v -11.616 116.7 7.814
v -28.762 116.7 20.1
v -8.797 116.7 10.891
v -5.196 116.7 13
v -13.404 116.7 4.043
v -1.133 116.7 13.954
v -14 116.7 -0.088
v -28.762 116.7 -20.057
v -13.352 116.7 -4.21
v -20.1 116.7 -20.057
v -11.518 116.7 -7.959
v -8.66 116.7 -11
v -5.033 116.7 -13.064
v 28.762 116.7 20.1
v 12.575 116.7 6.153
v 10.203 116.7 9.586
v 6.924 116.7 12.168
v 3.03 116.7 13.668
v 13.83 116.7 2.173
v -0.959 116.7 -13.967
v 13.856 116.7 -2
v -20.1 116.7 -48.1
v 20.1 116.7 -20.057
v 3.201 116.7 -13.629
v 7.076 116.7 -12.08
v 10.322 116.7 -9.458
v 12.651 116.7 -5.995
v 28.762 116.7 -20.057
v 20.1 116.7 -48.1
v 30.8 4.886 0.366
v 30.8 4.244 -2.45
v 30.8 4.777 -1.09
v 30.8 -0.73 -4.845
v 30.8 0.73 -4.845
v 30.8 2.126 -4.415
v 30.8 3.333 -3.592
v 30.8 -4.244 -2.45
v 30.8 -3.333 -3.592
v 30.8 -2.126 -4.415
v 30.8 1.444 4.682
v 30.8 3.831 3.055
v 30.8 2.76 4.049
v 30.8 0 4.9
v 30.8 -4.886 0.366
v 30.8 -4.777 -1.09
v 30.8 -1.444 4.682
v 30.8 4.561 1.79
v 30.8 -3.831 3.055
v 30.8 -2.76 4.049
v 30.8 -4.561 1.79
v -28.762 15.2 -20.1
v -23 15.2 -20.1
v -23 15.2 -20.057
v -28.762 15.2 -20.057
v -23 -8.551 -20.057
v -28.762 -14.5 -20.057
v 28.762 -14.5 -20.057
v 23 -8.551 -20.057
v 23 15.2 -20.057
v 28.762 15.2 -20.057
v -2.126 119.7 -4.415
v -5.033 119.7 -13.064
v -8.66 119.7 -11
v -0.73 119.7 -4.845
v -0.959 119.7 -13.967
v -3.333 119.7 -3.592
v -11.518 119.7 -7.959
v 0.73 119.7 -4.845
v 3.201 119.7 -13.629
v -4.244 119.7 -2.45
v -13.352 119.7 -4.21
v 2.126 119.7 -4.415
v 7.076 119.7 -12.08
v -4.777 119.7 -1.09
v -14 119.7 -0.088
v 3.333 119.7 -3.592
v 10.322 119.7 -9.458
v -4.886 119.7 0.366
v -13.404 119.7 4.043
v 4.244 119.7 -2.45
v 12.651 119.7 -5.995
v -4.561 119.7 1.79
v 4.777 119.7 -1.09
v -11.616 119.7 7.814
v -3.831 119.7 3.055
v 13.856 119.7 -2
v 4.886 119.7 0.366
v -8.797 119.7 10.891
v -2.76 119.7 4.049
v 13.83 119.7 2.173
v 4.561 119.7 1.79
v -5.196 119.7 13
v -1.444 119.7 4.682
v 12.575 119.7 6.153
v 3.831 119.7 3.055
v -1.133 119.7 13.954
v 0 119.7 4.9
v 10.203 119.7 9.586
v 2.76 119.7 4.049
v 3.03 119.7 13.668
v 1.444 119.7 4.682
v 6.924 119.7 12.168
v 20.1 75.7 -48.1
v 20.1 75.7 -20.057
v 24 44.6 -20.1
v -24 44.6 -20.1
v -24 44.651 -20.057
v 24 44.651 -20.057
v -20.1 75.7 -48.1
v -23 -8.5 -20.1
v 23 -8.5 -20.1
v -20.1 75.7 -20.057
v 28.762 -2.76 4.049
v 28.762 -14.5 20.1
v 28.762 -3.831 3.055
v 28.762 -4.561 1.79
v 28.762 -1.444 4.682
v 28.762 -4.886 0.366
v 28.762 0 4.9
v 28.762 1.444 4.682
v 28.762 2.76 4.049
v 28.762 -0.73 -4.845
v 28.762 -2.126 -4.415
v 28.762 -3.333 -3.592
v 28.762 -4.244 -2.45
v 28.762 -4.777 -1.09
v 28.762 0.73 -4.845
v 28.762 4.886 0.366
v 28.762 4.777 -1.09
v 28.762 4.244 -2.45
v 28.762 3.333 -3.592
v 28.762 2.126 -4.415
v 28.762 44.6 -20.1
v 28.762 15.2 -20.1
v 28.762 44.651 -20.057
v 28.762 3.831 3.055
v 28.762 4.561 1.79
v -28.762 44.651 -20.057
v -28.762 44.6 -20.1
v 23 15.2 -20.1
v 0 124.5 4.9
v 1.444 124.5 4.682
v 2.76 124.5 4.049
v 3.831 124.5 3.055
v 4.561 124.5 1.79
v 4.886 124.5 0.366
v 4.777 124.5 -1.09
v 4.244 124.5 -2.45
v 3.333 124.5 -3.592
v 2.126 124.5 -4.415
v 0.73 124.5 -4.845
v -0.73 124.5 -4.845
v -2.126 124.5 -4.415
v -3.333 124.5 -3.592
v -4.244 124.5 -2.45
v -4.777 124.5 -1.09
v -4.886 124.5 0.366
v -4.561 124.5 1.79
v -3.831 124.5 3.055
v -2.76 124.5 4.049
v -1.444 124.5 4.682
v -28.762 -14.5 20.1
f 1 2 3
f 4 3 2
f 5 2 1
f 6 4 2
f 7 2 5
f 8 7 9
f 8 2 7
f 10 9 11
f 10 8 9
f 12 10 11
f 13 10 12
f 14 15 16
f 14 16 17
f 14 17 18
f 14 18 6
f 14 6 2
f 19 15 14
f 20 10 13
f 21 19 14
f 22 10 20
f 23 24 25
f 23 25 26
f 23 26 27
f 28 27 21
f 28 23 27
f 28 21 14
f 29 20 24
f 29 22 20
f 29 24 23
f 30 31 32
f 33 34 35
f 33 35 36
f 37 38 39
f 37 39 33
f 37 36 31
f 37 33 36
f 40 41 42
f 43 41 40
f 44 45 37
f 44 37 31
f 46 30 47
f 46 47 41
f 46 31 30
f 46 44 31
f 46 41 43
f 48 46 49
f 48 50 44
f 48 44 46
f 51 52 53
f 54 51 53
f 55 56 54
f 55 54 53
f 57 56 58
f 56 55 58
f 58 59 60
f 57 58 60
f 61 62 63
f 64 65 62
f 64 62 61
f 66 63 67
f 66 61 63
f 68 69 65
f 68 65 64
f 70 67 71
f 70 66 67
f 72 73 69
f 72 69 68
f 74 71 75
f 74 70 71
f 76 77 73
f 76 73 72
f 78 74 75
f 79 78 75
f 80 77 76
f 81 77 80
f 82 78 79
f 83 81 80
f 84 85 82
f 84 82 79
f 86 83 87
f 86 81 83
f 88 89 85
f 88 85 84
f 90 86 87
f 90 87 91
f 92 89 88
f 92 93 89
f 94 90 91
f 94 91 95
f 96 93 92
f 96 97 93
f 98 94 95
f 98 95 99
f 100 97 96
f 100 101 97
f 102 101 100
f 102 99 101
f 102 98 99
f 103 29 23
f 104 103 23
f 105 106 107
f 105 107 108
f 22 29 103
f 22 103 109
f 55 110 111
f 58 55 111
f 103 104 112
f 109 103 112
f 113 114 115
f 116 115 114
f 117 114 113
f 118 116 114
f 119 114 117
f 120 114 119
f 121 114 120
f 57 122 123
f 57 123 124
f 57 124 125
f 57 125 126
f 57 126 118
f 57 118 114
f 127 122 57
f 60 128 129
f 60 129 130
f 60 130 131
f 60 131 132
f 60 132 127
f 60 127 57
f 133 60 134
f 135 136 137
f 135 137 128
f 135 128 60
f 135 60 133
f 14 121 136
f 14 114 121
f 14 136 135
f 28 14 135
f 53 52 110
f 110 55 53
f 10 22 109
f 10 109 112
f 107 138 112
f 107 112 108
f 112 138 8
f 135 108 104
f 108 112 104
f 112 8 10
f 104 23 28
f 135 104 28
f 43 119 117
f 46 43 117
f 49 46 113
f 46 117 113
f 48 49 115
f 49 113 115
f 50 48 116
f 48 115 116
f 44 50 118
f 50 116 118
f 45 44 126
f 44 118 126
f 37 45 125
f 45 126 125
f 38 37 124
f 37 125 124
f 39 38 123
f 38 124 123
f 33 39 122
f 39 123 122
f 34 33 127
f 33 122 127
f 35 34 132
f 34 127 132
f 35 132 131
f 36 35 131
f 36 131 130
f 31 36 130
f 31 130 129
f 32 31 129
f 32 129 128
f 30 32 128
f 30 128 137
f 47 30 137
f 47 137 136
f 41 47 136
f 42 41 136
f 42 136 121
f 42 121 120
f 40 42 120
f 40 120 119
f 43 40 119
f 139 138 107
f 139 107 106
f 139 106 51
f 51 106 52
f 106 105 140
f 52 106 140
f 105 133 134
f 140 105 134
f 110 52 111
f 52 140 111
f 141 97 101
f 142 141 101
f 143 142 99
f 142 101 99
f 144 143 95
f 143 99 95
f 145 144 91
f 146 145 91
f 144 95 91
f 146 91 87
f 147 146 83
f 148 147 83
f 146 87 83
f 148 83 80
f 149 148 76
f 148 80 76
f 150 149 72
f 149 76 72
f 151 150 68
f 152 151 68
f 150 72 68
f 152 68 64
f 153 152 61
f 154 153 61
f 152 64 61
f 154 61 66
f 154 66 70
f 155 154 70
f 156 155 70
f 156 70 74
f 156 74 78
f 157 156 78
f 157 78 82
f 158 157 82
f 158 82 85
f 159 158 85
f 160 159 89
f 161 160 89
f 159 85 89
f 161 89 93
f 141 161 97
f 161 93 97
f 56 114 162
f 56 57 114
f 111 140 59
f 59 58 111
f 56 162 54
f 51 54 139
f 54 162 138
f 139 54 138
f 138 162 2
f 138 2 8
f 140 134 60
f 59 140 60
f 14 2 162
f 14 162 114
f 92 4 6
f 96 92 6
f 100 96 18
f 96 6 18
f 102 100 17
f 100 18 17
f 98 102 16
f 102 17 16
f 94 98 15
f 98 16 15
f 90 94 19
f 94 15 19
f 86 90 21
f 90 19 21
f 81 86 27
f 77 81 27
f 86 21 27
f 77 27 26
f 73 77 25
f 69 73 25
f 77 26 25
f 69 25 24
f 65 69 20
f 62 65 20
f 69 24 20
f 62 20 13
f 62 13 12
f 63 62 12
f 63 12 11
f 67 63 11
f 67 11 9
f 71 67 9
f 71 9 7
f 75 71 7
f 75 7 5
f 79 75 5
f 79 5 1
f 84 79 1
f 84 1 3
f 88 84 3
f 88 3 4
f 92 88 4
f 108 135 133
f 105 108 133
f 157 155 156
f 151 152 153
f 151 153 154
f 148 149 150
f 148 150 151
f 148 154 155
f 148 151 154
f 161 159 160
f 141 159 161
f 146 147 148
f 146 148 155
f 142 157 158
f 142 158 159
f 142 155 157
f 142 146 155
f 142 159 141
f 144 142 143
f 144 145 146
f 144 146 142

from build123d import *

# Parameters (mm, degrees)
SKETCH1_W                 = 46
SKETCH1_H                 = 40.2
BOSS_EXTRUDE1_DEPTH       = 65.1
SKETCH3_R                 = 14
BOSS_EXTRUDE2_DEPTH       = 3
SKETCH4_R                 = 4.9
BOSS_EXTRUDE3_DEPTH       = 4.8
SKETCH7_W                 = 40.2
SKETCH7_H                 = 35.4
BOSS_EXTRUDE6_DEPTH       = 1
CHAMFER1_SIZE             = 6
CHAMFER1_SIZE2            = 5.1
MIRROR3_START             = 44.200099823
MIRROR3_OUTLINE_W         = 50
MIRROR3_OUTLINE_H         = 11
MIRROR3_DEPTH             = 3.885890521
CHAMFER1_OF_MIRROR8_SIZE2 = 5.1
CHAMFER1_OF_MIRROR8_SIZE  = 6
BOSS_EXTRUDE7_DEPTH       = 4.7625
SKETCH9_W                 = 40.2
SKETCH9_H                 = 61.1
BOSS_EXTRUDE8_DEPTH       = 41
SKETCH10_W                = 38
SKETCH10_H                = 38
BOSS_EXTRUDE9_DEPTH       = 9.3
SKETCH11_R                = 14
BOSS_EXTRUDE10_DEPTH      = 3
SKETCH12_R                = 4.9
BOSS_EXTRUDE11_DEPTH      = 4.8
BOSS_EXTRUDE12_REACH      = 145.093
SKETCH13_W                = 57.525
SKETCH13_H                = 40.156919592


# Read off the part's stored shape, not the designer's step: Mirror3
with BuildPart() as part:
    # Sketch1 → Boss-Extrude1 (new body)
    with BuildSketch(Plane(origin=(0, -14.5, 0), x_dir=(-1, 0, 0), z_dir=(0, 1, 0))):
        Rectangle(SKETCH1_W, SKETCH1_H)
    extrude(amount=BOSS_EXTRUDE1_DEPTH)

    # Sketch3 → Boss-Extrude2 (add)
    with BuildSketch(Plane.ZY.offset(-23)):
        Circle(SKETCH3_R)
    extrude(amount=-BOSS_EXTRUDE2_DEPTH)

    # Sketch4 → Boss-Extrude3 (add)
    with BuildSketch(Plane(origin=(26, 0, 0), x_dir=(0, 0, -1), z_dir=(1, 0, 0))):
        with Locations(Location((0, 0, 0), (0, 0, 180))):
            Circle(SKETCH4_R)
    extrude(amount=BOSS_EXTRUDE3_DEPTH)

    # Sketch7 → Boss-Extrude6 (add)
    with BuildSketch(Plane.ZY.offset(23)):
        with Locations((0, 32.9)):
            Rectangle(SKETCH7_W, SKETCH7_H)
    boss_extrude6 = extrude(amount=BOSS_EXTRUDE6_DEPTH)

    # Mirror1: Boss-Extrude6 across plane
    add(boss_extrude6.mirror(Plane(origin=(0, 0, 0), x_dir=(0, 0, 1), z_dir=(1, 0, 0))))

    # Chamfer1
    chamfer1_edges = [part.edges().sort_by_distance(p)[0] for p in [
        (0, 50.6, 20.1),
    ]]
    chamfer1_side = [part.faces().sort_by_distance(p)[0] for p in [
        (0, 18.392982971, 20.1),
    ]]
    chamfer(chamfer1_edges, length=CHAMFER1_SIZE, length2=CHAMFER1_SIZE2, reference=chamfer1_side[0])

    # Mirror3 outline → Mirror3 (cut)
    with BuildSketch(Plane(origin=(0, 0, 0), x_dir=(1, 0, 0), z_dir=(0, 0.6476484200955404, -0.7619393177594594)).offset(MIRROR3_START)):
        with Locations((0, -24.5)):
            Rectangle(MIRROR3_OUTLINE_W, MIRROR3_OUTLINE_H)
    mirror3 = extrude(amount=MIRROR3_DEPTH, mode=Mode.SUBTRACT)

    # Mirror8: Mirror3 across plane
    add(mirror3.mirror(Plane.ZX.offset(18.05)), mode=Mode.SUBTRACT)

    # Chamfer1 of Mirror8
    chamfer1_of_mirror8_edges = [part.edges().sort_by_distance(p)[0] for p in [
        (0, -14.5, 20.1),
    ]]
    chamfer(chamfer1_of_mirror8_edges, length=CHAMFER1_OF_MIRROR8_SIZE, length2=CHAMFER1_OF_MIRROR8_SIZE2)

    # Sketch8 → Boss-Extrude7 (add)
    with BuildSketch(Plane(origin=(24, 0, 0), x_dir=(0, 0, -1), z_dir=(1, 0, 0))):
        Polygon((20.1, 15.2), (8.9, 15.2), (-20.1, 31.2), (-20.1, 115.2), (8.9, 115.2), (8.9, 57.776470588), (20.1, 44.6), align=None)
    boss_extrude7 = extrude(amount=BOSS_EXTRUDE7_DEPTH)

    # Mirror4: Boss-Extrude7 across plane
    add(boss_extrude7.mirror(Plane(origin=(0, 0, 0), x_dir=(0, 0, 1), z_dir=(1, 0, 0))))



with BuildPart() as body_2:
    # Sketch9 → Boss-Extrude8 (new body)
    with BuildSketch(Plane(origin=(0, 116.7, 0), x_dir=(-1, 0, 0), z_dir=(0, 1, 0))):
        with Locations((0, -17.55)):
            Rectangle(SKETCH9_W, SKETCH9_H)
    extrude(amount=-BOSS_EXTRUDE8_DEPTH)


with BuildPart() as part_1:
    add(part.part)

    add(body_2.part)  # Boss-Extrude9 merges body 2
    # Sketch10 → Boss-Extrude9 (add)
    with BuildSketch(Plane.ZY.offset(-24)):
        with Locations((1.1, 96.2)):
            Rectangle(SKETCH10_W, SKETCH10_H)
    boss_extrude9 = extrude(amount=BOSS_EXTRUDE9_DEPTH)

    # Mirror6: Boss-Extrude9 across plane
    add(boss_extrude9.mirror(Plane(origin=(0, 0, 0), x_dir=(0, 0, 1), z_dir=(1, 0, 0))))

    # Sketch11 → Boss-Extrude10 (add)
    with BuildSketch(Plane(origin=(0, 116.7, 0), x_dir=(-1, 0, 0), z_dir=(0, 1, 0))):
        with Locations(Location((0, 0, 0), (0, 0, 68.213210702))):
            Circle(SKETCH11_R)
    extrude(amount=BOSS_EXTRUDE10_DEPTH)

    # Sketch12 → Boss-Extrude11 (add)
    with BuildSketch(Plane(origin=(0, 119.7, 0), x_dir=(1, 0, 0), z_dir=(0, 1, 0))):
        with Locations(Location((0, 0, 0), (0, 0, 270))):
            Circle(SKETCH12_R)
    extrude(amount=BOSS_EXTRUDE11_DEPTH)

    # Boss-Extrude12: up to this face of the body (flat: up to its plane)
    boss_extrude12_end = Plane(part_1.part.faces().sort_by_distance((0, -14.5, 0))[0])
    # Sketch13 → Boss-Extrude12 (add, up to the picked face)
    with BuildSketch(Plane(origin=(0, 116.7, 0), x_dir=(1, 0, 0), z_dir=(0, 1, 0)), mode=Mode.PRIVATE) as boss_extrude12_sk1:
        with Locations((0, -0.021540204)):
            Rectangle(SKETCH13_W, SKETCH13_H)
    boss_extrude12_tool1 = split(extrude(boss_extrude12_sk1.sketch, amount=-BOSS_EXTRUDE12_REACH, mode=Mode.PRIVATE), bisect_by=boss_extrude12_end, keep=Keep.BOTH, mode=Mode.PRIVATE)
    add(boss_extrude12_tool1.solids().sort_by(Axis((0, 116.7, 0.02154), (0, -1, 0)))[0])


solid = part_1.part
